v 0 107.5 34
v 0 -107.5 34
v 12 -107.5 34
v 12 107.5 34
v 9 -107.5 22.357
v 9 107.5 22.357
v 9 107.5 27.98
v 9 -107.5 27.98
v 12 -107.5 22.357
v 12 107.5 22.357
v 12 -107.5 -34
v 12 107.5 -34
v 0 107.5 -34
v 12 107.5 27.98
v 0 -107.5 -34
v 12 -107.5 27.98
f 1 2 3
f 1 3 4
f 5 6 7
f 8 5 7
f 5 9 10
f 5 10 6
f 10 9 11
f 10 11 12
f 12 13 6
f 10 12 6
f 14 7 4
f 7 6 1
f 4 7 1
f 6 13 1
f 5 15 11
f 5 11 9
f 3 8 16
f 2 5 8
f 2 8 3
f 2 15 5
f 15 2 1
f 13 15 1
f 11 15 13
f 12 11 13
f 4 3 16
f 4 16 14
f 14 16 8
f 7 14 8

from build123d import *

# Parameters (mm, degrees)
F0_W     = 215
F0_H     = 68
F1_DEPTH = 12
F2_W     = 3
F2_H     = 5.623123
F3_DEPTH = 300


with BuildPart() as f1:
    # F0 (on Right) → F1 (new body)
    with BuildSketch(Plane.YZ):
        Rectangle(F0_W, F0_H)
    extrude(amount=F1_DEPTH)

    # F2 (on face) → F3 (cut)
    with BuildSketch(Plane(origin=(0, 107.5, 0), x_dir=(-1, 0, 0), z_dir=(0, 1, 0))):
        with Locations((-10.5, 25.16836)):
            Rectangle(F2_W, F2_H)
    extrude(amount=-F3_DEPTH, mode=Mode.SUBTRACT)


solid = f1.part
